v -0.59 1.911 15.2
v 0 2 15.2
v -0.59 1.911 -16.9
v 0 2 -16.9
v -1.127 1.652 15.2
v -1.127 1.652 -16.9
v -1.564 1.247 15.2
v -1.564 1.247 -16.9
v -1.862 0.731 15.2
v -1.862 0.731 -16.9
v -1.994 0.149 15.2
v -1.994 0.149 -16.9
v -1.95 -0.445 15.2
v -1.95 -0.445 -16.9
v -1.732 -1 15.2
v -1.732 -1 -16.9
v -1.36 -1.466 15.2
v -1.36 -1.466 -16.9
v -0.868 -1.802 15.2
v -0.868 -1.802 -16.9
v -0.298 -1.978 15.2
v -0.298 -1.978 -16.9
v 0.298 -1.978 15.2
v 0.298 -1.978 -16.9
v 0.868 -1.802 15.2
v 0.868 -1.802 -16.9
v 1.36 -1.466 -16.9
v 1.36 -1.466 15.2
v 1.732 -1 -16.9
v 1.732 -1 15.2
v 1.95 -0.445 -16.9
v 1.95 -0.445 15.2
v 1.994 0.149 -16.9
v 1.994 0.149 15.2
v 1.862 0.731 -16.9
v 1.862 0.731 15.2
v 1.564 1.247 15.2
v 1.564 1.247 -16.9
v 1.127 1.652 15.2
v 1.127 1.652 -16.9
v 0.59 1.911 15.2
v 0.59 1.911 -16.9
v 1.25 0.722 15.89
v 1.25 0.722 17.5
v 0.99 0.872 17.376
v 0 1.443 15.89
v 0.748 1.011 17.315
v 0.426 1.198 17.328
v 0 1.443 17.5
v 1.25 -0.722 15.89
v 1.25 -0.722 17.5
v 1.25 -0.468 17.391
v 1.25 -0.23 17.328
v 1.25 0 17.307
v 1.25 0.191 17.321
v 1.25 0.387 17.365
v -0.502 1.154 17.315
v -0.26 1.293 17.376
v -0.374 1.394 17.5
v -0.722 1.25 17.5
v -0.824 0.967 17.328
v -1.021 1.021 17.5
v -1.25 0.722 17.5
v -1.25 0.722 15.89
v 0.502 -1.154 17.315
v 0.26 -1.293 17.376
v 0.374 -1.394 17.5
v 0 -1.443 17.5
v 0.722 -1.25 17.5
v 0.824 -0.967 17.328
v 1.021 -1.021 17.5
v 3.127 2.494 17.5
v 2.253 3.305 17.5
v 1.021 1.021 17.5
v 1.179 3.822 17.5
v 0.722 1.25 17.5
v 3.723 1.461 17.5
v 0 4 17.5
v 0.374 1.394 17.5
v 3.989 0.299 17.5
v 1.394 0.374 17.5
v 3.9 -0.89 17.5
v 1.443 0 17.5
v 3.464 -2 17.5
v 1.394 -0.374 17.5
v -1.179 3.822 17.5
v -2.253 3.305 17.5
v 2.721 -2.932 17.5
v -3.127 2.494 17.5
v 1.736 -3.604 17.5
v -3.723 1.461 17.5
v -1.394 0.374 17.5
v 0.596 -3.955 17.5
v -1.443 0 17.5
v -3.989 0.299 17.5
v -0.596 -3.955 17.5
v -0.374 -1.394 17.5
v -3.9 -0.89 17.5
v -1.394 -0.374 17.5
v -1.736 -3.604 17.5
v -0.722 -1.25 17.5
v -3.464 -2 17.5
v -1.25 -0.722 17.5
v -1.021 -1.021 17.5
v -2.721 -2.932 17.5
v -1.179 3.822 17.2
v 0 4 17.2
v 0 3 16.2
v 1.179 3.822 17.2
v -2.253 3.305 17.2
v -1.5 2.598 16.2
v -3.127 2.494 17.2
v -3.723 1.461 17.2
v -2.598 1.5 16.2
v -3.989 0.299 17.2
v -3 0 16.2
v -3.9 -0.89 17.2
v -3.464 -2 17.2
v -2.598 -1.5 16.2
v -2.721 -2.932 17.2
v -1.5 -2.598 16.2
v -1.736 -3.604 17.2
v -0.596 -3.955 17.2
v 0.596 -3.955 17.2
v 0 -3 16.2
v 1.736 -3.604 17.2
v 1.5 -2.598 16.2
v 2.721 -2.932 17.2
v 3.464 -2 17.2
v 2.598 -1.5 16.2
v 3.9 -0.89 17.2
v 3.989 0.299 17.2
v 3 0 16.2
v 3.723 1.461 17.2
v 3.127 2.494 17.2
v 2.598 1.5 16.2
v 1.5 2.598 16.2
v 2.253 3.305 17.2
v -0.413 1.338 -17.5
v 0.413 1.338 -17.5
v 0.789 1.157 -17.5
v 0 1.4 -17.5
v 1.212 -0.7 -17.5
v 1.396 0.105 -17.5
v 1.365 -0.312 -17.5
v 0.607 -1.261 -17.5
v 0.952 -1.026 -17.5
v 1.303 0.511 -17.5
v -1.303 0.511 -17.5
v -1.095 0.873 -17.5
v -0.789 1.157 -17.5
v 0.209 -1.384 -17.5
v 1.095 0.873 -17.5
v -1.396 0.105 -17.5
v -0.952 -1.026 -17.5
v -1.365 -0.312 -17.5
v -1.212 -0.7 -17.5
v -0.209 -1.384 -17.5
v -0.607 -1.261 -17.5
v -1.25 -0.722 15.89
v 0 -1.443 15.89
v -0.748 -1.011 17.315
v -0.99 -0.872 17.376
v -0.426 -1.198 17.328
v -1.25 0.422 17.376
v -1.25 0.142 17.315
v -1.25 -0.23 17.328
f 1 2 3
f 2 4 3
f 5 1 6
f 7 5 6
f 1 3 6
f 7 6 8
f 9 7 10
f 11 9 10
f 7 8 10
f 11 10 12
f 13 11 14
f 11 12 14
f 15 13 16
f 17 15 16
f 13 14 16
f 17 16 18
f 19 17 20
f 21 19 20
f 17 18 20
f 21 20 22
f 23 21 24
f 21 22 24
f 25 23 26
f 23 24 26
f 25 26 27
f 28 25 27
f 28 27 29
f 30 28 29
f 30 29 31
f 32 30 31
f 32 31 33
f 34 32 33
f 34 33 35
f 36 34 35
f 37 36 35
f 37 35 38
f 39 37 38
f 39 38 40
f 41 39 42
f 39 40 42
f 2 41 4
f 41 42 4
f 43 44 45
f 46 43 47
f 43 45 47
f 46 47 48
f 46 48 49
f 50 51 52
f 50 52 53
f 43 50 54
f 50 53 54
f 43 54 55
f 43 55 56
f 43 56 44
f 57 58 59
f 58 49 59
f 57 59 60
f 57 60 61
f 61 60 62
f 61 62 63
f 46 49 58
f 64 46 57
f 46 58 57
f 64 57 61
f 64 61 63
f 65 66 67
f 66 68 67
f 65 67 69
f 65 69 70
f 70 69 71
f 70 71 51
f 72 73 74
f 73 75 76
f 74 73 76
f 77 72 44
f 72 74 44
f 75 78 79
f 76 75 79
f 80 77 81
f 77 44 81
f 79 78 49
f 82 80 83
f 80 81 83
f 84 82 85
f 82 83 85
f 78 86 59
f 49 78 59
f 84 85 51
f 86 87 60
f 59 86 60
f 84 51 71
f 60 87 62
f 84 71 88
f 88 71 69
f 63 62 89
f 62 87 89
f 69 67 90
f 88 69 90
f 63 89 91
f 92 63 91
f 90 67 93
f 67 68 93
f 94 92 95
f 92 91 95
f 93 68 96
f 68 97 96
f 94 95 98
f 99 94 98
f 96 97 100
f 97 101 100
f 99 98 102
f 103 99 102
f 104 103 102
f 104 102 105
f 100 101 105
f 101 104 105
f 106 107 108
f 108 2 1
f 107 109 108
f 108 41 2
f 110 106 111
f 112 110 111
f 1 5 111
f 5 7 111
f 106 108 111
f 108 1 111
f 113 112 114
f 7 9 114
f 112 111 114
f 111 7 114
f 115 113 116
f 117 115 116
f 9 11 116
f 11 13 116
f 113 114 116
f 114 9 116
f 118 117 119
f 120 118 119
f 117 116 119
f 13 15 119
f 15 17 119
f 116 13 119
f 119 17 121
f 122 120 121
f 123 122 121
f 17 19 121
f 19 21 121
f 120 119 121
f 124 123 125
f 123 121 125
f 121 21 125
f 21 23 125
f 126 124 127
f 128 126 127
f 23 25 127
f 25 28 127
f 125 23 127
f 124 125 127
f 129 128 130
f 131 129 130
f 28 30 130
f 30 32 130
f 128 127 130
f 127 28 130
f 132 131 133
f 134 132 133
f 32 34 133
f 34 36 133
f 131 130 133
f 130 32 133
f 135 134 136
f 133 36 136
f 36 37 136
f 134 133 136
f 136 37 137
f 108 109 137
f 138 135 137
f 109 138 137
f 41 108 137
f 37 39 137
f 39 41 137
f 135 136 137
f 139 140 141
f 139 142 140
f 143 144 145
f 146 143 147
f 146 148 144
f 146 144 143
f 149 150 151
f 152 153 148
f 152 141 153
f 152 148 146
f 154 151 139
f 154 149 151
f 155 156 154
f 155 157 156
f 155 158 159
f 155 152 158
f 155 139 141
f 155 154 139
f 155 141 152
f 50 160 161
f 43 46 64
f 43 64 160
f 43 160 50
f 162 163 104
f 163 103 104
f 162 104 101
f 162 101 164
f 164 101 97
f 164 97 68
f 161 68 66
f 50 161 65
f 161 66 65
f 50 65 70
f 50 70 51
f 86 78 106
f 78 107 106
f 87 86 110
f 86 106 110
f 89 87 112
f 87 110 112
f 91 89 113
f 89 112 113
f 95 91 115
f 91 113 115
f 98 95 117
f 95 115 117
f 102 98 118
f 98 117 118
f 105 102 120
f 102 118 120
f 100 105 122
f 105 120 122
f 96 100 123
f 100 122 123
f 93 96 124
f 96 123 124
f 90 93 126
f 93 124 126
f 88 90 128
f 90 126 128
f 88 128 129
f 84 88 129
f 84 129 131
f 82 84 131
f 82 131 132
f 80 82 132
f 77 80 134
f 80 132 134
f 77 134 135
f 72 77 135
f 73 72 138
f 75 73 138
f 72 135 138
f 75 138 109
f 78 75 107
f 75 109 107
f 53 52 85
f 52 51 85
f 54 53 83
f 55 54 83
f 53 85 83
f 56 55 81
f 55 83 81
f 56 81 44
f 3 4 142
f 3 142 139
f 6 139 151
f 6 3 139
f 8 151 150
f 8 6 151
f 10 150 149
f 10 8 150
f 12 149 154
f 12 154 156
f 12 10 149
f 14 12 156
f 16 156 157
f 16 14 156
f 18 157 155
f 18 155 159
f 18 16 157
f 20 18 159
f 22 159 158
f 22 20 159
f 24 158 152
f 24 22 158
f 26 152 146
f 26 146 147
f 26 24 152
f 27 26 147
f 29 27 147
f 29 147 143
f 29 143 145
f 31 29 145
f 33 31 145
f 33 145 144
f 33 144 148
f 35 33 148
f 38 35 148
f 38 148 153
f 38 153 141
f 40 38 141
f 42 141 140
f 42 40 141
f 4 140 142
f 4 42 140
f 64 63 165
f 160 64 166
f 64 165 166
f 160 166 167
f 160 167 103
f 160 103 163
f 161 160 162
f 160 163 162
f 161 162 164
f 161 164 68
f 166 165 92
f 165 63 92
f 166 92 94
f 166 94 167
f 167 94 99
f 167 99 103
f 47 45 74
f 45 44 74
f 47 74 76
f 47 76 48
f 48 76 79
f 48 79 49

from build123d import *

# Parameters (mm, degrees)
SKETCH3_W          = 35
SKETCH3_H          = 2
CHAMFER1_SIZE      = 0.6
CUT_EXTRUDE1_DEPTH = 1.61
SKETCH9_R          = 1.443375673
CUT_EXTRUDE2_DEPTH = 1.61
CUT_EXTRUDE2_DRAFT = -45


with BuildPart() as part:
    # Sketch3 → Revolve1 (revolve)
    with BuildSketch(Plane(origin=(0, 0, 0), x_dir=(0, 0, -1), z_dir=(1, 0, 0))):
        with Locations((0, 1)):
            Rectangle(SKETCH3_W, SKETCH3_H)
    revolve(axis=Axis((0, 0, -17.5), (0, 0, 1)))

    # Chamfer1
    chamfer1_edges = [part.edges().sort_by_distance(p)[0] for p in [
        (0, -2, -17.5),
    ]]
    chamfer(chamfer1_edges, length=CHAMFER1_SIZE)

    # Sketch6 → Revolve2 (revolve)
    with BuildSketch(Plane(origin=(0, 0, 0), x_dir=(0, 0, -1), z_dir=(1, 0, 0))):
        Polygon((-17.5, 4), (-17.2, 4), (-15.2, 2), (-15.2, 0), (-17.5, 0), align=None)
    revolve(axis=Axis((0, 0, -17.5), (0, 0, 1)))

    # Sketch8 → Cut-Extrude1 (cut)
    with BuildSketch(Plane.XY.offset(17.5)):
        Polygon((0, 1.443375673), (-1.25, 0.721687836), (-1.25, -0.721687836), (0, -1.443375673), (1.25, -0.721687836), (1.25, 0.721687836), align=None)
    extrude(amount=-CUT_EXTRUDE1_DEPTH, mode=Mode.SUBTRACT)


with BuildPart() as cut_extrude2_tool:
    # Sketch9 → Cut-Extrude2 (with draft: the straight prism first)
    with BuildSketch(Plane.XY.offset(17.5)):
        Circle(SKETCH9_R)
    extrude(amount=-CUT_EXTRUDE2_DEPTH)
    # Cut-Extrude2: the draft: its side faces are tilted about the plane it starts from
    cut_extrude2_sides = [cut_extrude2_tool.faces().sort_by_distance(p)[0] for p in [
        (-1.443375673, 0, 16.695),
    ]]
    draft(cut_extrude2_sides, Plane.XY.offset(17.5), CUT_EXTRUDE2_DRAFT)


with BuildPart() as part_1:
    add(part.part)

    # Cut-Extrude2: cut by cut_extrude2_tool
    add(cut_extrude2_tool.part, mode=Mode.SUBTRACT)


solid = part_1.part
